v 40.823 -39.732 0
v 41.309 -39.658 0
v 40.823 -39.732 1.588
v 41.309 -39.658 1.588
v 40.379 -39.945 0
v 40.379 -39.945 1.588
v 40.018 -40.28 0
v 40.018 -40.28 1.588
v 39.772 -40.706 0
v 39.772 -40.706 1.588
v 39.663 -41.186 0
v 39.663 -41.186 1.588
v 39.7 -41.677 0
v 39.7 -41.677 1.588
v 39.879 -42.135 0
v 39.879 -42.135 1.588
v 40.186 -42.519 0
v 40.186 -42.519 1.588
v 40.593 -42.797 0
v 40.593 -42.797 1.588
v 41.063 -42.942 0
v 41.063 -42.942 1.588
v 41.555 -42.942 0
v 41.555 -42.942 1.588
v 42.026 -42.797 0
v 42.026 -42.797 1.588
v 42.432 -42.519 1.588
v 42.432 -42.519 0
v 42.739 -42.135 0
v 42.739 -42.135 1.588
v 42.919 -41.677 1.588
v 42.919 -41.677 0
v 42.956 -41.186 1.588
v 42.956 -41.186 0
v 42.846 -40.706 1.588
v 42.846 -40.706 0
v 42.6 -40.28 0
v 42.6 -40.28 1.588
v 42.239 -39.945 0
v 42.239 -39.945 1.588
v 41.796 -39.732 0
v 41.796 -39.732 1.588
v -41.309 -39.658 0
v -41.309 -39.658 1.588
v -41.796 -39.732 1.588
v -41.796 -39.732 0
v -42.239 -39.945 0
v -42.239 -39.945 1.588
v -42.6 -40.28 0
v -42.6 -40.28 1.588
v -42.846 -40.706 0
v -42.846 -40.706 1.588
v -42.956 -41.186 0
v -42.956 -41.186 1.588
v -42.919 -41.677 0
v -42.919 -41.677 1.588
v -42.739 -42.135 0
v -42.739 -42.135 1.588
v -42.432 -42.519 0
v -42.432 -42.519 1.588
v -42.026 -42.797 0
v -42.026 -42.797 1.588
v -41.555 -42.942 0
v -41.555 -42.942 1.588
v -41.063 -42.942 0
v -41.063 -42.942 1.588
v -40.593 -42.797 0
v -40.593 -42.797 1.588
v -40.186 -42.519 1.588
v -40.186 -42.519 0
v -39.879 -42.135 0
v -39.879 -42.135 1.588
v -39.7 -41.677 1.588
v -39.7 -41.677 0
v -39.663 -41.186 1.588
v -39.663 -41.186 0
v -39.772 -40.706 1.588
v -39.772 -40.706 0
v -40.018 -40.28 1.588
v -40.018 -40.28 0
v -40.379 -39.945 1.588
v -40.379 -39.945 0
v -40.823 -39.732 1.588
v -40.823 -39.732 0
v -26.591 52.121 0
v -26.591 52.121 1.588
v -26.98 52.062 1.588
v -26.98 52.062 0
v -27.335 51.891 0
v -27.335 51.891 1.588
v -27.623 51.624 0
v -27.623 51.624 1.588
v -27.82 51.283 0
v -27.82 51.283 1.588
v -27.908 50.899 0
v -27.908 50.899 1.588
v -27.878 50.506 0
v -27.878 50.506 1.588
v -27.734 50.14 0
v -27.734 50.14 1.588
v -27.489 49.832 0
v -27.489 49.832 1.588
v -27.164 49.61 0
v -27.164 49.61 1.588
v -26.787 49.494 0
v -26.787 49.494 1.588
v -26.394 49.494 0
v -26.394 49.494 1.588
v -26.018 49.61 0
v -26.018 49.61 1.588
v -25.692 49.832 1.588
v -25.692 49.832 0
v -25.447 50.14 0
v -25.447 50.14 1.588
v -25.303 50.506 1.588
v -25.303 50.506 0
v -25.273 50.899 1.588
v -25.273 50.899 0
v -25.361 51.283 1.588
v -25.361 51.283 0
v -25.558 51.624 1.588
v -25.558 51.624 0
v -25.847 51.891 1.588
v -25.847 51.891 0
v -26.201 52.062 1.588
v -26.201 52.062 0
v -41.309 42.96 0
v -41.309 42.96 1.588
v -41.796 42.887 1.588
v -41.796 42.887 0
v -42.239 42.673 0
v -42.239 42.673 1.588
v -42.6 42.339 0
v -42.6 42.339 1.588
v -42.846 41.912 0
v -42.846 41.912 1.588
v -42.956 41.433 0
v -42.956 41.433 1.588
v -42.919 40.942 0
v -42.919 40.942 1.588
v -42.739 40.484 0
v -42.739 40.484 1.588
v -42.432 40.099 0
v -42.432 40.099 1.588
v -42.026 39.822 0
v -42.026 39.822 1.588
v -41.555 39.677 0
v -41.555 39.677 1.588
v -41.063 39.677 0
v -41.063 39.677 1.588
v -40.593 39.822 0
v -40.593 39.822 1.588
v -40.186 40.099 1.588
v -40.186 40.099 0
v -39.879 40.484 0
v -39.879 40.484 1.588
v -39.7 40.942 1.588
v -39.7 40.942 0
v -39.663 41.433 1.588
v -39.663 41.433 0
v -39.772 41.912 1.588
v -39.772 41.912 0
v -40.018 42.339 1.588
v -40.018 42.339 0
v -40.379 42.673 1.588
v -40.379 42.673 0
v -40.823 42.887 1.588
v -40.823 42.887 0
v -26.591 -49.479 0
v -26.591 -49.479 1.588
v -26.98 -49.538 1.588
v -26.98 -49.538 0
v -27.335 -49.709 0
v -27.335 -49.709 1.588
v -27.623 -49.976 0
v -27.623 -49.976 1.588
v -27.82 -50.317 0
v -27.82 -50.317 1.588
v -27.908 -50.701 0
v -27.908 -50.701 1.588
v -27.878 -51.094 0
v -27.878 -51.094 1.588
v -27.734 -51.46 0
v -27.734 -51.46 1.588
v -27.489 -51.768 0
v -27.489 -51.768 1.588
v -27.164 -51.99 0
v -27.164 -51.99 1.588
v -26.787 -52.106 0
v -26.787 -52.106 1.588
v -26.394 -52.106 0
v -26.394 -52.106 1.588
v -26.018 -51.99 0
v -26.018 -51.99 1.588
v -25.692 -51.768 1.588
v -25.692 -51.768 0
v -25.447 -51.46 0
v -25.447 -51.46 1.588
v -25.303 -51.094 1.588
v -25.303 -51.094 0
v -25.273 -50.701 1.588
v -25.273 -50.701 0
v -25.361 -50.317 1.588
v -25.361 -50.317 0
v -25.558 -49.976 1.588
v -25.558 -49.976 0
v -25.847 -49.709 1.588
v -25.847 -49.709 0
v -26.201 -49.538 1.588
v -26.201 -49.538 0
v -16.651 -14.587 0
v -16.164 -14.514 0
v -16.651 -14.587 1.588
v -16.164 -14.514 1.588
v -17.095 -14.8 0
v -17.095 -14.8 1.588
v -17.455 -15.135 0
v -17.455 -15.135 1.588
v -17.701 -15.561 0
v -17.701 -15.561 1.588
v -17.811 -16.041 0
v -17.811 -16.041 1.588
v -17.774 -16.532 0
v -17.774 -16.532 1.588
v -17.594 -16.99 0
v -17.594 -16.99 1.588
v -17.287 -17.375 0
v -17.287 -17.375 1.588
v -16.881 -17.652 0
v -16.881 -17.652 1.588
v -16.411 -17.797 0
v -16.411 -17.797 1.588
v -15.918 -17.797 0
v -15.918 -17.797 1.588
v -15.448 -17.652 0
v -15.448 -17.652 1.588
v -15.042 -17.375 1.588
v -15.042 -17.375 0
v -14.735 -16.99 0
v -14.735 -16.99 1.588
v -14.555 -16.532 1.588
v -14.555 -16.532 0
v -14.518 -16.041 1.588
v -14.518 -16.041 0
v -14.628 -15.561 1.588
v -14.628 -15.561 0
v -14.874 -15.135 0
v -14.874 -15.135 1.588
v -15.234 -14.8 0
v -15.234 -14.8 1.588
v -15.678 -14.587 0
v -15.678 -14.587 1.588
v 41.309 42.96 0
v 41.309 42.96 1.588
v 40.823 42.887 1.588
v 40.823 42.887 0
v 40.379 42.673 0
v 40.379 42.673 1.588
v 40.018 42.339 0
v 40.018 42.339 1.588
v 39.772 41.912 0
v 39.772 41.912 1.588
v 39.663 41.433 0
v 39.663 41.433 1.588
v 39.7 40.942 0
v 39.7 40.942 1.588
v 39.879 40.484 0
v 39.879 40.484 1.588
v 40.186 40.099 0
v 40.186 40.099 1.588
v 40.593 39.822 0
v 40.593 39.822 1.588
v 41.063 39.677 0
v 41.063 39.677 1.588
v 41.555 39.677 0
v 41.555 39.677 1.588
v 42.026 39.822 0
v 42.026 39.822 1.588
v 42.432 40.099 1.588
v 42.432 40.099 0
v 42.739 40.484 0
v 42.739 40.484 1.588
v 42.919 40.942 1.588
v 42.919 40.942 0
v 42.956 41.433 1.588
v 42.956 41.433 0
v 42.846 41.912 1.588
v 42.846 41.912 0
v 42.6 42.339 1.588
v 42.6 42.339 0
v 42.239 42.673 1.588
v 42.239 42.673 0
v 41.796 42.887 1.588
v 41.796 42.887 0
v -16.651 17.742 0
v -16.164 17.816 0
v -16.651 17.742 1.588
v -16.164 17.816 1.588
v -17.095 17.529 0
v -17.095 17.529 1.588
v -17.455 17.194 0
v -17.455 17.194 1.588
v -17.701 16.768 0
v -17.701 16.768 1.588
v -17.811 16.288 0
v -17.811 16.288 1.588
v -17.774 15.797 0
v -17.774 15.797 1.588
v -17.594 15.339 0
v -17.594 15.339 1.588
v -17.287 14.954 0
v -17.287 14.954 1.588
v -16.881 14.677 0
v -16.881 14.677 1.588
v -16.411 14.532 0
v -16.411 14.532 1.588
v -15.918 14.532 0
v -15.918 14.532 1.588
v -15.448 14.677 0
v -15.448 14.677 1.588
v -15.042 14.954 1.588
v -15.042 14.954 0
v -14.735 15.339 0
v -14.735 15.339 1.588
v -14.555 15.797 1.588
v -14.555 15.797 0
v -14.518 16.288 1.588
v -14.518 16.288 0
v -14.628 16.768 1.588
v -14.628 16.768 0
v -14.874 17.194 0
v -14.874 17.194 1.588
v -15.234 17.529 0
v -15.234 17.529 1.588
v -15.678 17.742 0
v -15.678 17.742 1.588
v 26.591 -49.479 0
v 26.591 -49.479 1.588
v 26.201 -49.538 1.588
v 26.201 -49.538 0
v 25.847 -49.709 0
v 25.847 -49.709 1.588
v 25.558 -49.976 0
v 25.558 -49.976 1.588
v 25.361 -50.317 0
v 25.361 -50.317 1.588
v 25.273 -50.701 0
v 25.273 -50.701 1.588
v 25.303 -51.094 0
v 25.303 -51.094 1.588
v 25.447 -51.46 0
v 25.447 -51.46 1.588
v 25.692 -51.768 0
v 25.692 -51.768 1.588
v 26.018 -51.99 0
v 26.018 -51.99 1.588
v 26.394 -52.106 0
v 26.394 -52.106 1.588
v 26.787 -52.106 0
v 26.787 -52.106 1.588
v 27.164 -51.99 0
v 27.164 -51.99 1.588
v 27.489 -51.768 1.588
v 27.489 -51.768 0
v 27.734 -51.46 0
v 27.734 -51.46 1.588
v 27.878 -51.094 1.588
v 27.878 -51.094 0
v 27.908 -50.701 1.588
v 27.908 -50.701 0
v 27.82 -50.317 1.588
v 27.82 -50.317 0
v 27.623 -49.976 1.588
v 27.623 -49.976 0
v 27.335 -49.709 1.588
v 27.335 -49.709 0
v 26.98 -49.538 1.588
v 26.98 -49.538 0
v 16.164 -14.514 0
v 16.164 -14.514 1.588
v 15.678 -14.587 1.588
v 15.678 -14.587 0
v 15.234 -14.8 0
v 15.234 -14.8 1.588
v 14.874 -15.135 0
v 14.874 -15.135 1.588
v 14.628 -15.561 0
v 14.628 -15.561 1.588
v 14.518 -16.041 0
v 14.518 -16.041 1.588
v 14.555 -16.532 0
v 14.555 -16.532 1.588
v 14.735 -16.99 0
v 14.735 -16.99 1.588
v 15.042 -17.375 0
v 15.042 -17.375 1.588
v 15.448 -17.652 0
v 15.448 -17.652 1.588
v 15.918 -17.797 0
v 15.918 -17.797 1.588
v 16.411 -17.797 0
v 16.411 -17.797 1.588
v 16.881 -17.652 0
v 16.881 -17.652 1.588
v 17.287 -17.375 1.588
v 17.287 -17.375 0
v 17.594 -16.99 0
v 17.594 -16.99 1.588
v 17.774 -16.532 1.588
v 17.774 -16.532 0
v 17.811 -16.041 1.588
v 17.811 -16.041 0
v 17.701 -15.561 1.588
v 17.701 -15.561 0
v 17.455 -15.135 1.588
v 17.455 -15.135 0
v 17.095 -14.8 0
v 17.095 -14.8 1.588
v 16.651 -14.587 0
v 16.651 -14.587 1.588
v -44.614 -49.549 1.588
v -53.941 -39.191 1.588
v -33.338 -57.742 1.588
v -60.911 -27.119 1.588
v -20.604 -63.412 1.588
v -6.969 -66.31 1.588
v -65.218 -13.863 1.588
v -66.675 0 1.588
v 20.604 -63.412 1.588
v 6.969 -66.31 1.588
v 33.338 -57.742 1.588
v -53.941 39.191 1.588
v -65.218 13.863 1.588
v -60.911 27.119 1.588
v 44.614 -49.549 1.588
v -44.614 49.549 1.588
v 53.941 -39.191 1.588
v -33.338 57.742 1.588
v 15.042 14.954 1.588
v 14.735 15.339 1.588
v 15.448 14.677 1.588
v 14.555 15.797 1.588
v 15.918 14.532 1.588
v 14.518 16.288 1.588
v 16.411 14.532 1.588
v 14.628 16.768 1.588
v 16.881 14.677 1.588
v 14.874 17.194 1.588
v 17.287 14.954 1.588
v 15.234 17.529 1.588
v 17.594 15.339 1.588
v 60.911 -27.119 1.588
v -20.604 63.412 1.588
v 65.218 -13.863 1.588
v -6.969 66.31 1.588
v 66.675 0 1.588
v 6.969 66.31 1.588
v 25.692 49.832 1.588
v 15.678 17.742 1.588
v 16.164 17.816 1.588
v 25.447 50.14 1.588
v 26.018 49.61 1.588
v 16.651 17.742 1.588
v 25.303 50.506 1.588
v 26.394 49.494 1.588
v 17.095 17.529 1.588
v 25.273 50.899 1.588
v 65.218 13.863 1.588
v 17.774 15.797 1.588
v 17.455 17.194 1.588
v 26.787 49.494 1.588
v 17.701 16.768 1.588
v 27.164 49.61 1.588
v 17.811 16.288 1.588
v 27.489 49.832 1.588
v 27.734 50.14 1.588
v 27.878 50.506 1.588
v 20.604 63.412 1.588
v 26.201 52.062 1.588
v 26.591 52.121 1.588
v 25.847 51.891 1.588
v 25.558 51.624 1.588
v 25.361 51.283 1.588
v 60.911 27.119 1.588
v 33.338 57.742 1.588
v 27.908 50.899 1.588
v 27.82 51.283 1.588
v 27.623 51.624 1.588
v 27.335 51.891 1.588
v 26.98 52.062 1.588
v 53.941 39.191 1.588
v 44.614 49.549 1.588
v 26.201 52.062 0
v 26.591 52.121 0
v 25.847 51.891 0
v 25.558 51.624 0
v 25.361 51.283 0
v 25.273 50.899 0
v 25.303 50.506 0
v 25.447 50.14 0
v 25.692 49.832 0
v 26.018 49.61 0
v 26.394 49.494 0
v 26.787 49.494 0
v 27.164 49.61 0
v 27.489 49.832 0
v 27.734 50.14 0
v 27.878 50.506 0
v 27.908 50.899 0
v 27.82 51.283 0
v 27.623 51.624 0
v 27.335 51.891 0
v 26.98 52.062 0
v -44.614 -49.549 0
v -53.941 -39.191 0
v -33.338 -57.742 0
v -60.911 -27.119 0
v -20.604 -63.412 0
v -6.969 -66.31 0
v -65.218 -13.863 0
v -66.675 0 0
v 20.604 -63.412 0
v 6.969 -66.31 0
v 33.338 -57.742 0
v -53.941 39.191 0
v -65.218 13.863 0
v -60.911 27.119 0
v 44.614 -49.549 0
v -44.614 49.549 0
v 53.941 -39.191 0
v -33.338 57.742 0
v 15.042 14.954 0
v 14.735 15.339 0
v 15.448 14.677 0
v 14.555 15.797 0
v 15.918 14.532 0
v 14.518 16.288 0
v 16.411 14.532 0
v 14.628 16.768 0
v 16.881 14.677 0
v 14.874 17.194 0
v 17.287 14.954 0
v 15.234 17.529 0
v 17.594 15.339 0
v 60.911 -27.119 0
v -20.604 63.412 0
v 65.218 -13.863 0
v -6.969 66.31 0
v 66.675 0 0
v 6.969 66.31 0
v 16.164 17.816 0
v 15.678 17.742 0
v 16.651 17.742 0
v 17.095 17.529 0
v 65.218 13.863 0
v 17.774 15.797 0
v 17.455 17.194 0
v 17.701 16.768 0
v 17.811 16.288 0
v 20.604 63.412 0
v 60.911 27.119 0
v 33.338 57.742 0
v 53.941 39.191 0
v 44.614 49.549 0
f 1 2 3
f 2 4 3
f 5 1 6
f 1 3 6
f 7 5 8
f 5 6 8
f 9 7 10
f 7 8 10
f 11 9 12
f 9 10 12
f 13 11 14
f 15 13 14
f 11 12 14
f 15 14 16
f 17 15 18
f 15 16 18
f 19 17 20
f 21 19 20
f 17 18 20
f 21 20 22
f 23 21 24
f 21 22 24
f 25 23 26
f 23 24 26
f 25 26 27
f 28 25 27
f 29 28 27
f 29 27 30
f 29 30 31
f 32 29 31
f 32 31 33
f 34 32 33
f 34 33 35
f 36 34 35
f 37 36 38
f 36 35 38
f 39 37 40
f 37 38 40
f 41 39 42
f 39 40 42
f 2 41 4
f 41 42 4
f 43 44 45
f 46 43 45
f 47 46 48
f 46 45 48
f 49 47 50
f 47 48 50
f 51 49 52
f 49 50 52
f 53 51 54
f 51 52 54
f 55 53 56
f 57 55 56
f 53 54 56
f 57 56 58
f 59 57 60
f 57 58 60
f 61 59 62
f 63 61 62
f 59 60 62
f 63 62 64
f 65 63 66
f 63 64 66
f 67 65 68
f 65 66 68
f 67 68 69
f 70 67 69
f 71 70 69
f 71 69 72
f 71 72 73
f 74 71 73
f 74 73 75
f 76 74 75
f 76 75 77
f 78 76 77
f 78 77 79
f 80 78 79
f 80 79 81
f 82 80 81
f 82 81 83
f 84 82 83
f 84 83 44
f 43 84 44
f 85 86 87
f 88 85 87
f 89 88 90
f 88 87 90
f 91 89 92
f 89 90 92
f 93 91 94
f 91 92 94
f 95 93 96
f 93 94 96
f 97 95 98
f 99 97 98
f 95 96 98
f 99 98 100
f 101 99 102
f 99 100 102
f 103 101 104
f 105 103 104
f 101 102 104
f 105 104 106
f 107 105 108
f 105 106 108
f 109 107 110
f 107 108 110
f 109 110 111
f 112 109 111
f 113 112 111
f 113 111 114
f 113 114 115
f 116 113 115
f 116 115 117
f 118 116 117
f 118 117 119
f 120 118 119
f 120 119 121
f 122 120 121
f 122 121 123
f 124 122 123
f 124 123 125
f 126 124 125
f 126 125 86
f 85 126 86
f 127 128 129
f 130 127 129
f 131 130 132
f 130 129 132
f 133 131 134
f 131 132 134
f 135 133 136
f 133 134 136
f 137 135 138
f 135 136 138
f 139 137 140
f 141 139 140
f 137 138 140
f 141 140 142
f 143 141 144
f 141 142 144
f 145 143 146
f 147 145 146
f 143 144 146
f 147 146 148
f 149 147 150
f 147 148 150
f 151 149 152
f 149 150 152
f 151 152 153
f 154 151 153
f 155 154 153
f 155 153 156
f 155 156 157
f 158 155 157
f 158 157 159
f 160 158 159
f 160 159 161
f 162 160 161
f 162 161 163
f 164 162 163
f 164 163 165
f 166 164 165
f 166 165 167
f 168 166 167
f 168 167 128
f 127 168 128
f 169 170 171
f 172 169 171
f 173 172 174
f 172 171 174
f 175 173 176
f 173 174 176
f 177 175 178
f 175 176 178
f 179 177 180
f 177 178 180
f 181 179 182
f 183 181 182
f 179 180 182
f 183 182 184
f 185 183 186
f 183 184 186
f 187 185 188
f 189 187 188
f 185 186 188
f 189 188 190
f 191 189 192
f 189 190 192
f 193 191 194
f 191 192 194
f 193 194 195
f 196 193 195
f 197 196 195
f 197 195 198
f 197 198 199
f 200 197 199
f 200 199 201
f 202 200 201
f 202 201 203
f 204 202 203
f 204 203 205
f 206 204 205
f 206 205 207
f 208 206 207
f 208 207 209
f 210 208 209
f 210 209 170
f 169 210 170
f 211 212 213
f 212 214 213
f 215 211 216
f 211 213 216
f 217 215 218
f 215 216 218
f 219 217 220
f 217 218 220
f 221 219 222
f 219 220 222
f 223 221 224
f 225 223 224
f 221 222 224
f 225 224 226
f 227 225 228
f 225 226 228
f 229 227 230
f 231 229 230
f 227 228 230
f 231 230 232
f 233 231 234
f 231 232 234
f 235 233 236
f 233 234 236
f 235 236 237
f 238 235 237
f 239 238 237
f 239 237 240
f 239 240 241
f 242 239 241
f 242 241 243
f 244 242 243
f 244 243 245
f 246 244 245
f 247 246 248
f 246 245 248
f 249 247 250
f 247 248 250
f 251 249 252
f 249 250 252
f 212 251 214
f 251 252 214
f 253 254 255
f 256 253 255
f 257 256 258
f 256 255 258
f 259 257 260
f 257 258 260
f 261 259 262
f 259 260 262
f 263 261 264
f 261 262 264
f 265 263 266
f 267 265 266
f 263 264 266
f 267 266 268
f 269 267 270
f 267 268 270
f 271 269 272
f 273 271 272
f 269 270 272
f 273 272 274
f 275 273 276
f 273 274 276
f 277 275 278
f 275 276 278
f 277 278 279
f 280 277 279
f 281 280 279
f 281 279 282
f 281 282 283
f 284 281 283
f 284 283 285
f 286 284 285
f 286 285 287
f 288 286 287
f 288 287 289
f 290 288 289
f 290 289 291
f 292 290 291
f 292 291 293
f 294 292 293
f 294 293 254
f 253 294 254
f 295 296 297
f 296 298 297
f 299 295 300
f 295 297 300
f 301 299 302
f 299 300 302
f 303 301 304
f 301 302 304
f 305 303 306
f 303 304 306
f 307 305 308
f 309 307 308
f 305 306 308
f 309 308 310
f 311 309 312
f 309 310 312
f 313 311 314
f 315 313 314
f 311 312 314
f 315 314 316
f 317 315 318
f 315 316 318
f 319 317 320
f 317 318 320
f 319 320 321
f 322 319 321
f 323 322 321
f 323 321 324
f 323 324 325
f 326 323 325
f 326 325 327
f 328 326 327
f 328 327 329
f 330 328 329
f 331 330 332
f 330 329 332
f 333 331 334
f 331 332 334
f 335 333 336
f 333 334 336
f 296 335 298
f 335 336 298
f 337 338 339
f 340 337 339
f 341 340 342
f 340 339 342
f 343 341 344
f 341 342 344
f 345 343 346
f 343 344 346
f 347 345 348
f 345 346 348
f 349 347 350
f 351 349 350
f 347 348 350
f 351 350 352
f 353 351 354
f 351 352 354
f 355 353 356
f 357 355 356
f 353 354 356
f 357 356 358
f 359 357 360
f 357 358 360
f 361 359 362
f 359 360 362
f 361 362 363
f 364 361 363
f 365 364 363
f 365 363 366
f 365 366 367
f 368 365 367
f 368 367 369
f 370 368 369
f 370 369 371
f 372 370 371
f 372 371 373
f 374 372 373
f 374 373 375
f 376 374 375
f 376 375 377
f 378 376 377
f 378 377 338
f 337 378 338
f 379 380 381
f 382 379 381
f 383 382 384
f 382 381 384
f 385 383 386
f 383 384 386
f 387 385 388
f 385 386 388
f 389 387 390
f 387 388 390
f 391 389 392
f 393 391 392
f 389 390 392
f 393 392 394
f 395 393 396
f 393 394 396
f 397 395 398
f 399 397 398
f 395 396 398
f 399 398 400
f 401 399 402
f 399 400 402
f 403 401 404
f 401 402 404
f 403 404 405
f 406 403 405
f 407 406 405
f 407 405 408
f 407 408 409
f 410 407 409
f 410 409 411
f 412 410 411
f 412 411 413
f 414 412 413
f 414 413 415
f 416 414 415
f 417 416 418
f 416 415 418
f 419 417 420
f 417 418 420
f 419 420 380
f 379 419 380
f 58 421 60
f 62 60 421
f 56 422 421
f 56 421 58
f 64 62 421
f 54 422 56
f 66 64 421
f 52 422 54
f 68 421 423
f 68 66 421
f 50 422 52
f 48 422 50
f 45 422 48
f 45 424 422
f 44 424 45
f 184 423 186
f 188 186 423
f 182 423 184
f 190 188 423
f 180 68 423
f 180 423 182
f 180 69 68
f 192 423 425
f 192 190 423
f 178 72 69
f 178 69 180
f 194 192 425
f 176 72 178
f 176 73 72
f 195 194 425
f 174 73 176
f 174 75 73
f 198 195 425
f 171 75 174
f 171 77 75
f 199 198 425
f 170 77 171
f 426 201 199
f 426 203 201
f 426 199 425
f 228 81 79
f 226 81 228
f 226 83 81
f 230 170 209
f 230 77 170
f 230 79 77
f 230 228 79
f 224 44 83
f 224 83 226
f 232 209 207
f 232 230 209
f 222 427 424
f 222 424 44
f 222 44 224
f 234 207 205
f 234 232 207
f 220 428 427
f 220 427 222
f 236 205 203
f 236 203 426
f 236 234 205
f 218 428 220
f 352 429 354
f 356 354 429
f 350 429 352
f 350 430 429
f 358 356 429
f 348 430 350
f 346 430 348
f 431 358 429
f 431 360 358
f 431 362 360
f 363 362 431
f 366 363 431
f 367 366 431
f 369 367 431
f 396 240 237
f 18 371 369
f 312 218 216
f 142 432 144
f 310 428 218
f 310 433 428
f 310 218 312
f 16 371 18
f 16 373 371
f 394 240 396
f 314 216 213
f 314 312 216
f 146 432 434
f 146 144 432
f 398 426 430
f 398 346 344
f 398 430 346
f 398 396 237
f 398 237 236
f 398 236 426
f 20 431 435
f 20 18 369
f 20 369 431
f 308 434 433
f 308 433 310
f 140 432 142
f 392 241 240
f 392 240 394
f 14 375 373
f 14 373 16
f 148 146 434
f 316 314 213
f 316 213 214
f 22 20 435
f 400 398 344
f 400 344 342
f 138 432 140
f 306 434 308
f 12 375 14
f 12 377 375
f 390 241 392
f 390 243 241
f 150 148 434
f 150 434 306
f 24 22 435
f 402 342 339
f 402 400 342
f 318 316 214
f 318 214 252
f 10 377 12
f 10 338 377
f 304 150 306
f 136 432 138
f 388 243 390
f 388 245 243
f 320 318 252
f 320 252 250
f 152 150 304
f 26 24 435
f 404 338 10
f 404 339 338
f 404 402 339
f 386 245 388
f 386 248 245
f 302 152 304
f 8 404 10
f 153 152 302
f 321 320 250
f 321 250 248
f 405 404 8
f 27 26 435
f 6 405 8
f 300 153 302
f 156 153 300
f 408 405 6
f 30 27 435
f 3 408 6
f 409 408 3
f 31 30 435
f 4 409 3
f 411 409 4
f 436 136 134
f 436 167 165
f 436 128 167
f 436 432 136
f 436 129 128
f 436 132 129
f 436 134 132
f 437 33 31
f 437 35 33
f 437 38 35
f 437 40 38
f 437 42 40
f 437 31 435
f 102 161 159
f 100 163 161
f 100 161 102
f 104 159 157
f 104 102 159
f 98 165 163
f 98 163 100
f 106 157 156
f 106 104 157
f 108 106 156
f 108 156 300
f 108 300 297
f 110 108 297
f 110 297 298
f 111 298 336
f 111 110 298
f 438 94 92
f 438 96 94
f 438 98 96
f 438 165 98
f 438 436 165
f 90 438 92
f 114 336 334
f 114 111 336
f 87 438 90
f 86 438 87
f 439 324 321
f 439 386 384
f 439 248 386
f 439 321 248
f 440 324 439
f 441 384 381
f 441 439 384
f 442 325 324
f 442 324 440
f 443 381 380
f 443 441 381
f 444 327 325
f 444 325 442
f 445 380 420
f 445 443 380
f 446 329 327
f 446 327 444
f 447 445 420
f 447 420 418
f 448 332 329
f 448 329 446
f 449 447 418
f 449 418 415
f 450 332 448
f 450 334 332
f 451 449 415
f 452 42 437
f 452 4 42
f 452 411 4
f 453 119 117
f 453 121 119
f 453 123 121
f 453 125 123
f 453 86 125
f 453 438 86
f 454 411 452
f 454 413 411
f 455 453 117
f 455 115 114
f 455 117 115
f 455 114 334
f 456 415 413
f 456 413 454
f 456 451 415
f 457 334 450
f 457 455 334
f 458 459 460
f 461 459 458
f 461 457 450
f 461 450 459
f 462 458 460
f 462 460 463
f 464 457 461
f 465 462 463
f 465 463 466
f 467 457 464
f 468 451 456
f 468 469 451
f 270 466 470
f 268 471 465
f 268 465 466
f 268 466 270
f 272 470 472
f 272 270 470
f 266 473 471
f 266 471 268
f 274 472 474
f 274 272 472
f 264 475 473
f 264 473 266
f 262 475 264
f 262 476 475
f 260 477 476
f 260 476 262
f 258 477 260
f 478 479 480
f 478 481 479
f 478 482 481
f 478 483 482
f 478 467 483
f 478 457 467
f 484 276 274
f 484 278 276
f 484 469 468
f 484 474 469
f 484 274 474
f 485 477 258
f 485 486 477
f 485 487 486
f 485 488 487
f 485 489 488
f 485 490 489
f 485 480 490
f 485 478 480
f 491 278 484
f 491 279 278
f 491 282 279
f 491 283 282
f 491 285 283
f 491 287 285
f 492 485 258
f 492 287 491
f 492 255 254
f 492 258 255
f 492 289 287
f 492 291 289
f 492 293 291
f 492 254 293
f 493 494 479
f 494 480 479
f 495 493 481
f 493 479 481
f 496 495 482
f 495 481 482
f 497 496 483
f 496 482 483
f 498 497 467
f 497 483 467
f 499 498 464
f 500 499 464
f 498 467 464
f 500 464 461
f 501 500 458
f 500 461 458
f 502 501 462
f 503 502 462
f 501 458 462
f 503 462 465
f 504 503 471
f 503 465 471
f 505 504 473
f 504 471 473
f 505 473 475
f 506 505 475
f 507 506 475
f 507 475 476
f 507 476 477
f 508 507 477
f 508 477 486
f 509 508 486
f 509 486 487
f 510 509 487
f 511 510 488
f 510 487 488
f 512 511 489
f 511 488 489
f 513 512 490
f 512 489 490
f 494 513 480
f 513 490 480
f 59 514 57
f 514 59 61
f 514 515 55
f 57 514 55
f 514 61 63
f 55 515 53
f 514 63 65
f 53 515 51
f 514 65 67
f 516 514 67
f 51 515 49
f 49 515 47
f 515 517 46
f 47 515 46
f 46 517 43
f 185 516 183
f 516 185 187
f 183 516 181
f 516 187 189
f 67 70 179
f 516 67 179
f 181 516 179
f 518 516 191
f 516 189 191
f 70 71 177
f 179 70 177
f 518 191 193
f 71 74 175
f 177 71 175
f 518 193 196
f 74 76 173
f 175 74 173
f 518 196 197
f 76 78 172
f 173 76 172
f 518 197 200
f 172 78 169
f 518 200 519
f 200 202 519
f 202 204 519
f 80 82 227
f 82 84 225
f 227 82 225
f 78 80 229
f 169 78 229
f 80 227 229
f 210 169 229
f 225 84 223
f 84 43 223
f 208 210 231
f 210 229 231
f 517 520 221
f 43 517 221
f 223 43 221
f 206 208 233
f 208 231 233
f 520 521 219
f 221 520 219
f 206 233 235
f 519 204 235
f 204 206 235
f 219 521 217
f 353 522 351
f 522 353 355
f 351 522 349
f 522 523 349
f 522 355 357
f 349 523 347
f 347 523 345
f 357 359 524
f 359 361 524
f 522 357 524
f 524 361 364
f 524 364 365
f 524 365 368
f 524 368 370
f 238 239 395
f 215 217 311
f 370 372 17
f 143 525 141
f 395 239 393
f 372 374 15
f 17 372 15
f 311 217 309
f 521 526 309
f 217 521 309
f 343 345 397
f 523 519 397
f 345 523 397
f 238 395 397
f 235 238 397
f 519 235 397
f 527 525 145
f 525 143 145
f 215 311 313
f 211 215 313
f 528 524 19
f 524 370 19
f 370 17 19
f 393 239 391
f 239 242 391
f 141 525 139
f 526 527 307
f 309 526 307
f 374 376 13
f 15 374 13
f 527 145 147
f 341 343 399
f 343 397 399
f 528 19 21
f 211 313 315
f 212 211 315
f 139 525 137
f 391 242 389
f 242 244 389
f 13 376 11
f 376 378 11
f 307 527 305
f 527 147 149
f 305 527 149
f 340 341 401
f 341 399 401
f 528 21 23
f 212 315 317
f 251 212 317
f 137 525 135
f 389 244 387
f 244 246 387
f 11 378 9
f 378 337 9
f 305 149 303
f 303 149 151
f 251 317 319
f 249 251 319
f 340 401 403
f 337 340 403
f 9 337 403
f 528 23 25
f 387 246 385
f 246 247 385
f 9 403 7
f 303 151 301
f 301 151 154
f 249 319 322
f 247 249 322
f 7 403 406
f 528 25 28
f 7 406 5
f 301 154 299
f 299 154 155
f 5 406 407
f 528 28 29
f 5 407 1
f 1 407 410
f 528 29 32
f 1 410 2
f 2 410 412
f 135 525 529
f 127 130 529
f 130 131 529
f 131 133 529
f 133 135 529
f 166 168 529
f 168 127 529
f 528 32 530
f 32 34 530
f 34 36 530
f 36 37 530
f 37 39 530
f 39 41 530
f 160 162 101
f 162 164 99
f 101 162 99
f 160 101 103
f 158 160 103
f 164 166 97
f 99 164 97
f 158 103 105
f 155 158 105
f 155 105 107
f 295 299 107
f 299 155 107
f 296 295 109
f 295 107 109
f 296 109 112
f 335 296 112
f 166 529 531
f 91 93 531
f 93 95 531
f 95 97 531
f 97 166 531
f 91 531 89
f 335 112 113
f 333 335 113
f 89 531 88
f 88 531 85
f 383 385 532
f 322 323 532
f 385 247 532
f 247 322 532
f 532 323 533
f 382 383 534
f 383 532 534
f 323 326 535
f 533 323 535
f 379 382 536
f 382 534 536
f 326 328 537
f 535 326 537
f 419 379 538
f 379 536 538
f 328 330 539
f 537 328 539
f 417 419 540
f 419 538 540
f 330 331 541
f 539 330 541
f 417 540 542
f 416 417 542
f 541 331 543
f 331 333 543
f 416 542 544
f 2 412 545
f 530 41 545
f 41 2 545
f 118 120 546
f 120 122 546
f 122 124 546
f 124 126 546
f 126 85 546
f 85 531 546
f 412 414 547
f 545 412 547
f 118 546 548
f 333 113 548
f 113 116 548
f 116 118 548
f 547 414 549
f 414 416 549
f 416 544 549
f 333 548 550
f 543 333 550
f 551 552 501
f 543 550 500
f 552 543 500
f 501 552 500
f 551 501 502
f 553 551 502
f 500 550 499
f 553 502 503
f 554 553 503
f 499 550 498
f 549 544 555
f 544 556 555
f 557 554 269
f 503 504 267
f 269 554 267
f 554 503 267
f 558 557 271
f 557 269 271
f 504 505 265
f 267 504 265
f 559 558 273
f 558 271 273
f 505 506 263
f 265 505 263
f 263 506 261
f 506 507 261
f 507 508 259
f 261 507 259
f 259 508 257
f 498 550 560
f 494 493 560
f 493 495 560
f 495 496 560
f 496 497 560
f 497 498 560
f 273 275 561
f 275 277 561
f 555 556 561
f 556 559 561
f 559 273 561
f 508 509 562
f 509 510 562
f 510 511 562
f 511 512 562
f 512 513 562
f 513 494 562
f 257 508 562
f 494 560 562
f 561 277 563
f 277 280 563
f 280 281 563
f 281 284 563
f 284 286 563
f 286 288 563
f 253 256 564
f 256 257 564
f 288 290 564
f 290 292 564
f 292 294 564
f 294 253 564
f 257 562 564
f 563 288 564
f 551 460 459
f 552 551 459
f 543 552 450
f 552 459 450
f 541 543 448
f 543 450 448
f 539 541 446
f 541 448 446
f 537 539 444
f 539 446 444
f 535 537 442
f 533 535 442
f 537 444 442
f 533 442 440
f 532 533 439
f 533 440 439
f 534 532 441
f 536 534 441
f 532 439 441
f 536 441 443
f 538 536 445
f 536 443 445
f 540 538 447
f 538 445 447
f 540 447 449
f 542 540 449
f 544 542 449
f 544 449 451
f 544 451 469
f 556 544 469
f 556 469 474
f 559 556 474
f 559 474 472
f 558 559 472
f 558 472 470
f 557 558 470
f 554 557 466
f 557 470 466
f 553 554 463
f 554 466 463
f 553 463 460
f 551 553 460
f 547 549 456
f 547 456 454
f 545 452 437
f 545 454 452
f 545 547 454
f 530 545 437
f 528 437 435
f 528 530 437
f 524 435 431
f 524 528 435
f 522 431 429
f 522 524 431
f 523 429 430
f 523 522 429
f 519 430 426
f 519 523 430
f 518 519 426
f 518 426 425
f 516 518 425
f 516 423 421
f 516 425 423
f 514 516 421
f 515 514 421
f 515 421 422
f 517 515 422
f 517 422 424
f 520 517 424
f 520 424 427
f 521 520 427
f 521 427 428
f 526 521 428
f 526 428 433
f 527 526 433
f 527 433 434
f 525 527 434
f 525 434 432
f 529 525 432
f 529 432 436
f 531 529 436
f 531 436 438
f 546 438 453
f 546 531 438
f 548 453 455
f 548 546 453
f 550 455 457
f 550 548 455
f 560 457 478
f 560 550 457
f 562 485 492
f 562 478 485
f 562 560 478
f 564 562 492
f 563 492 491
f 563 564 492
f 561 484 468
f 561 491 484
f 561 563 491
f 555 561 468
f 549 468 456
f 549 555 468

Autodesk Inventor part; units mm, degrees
ref_plane "YZ Plane" through (0, 0, 0) normal (1, 0, 0) x (0, 1, 0)
ref_plane "XZ Plane" through (0, 0, 0) normal (0, 1, 0) x (-1, 0, 0)
ref_plane "XY Plane" through (0, 0, 0) normal (0, 0, 1) x (1, 0, 0)
sketch "Sketch1" plane through (0, 0, 0) normal (0, 0, 1) x (1, 0, 0)
  line L0 (0, 10.0078) -> (0, -10.7712)
  line L1 (-20.5368, 0) -> (25.7294, 0)
  line L2 (0, 0) -> (-9.8402, -9.8402)
  line L3 (0, 0) -> (13.9161, 0) construction
  line L4 (0, 0) -> (-23.2805, 23.2805)
  circle A0 centre (0, 0) radius 66.675
  point P0 (-16.1645, 16.1645)
  point P1 (-41.3092, 41.3092)
  point P2 (-41.3092, -41.3092)
  point P3 (-16.1645, -16.1645)
  point P4 (16.1645, 16.1645)
  point P5 (41.3092, 41.3092)
  point P6 (41.3092, -41.3092)
  point P7 (16.1645, -16.1645)
  point P8 (26.5906, 50.8)
  point P9 (-26.5906, 50.8)
  point P10 (23.2805, 23.2805)
  point P11 (16.1645, 16.1645)
  point P12 (26.5906, -50.8)
  point P13 (-26.5906, -50.8)
  dimension "d1" = 45
  dimension "d56" = 22.86
  dimension "d58" = 35.56
  dimension "d67" = 53.1812
  dimension "d68" = 101.6
  dimension "d85" = 133.35
extrude "Extrusion1" add sketch "Sketch1" along normal blind 1.5875
hole "Hole1" at (-16.1645, 16.1645, 0) at (-41.3092, 41.3092, 0) at (-41.3092, -41.3092, 0) at (-16.1645, -16.1645, 0) at (41.3092, 41.3092, 0) at (16.1645, 16.1645, 0) at (16.1645, -16.1645, 0) at (41.3092, -41.3092, 0) direction (0, 0, 1) diameter 3.302 end through all thread size "8-32 UNC" class "2B" standard "ANSI Unified Screw Threads"
sketch "Sketch2" plane through (0, 0, 0) normal (0, 0, -1) x (-1, 0, 0)
  line L0 (0, -11.8713) -> (0, 16.3095)
  line L1 (-16.3095, 0) -> (16.3095, 0)
  point P0 (23.2805, -60.3987)
  point P1 (0, 0)
  point P2 (26.5906, 50.8)
  point P3 (-26.5906, 50.8)
  point P4 (26.5906, -50.8)
  point P5 (-26.5906, -50.8)
  dimension "d69" = 53.1812
  dimension "d70" = 101.6
hole "Hole3" at (-26.5906, -50.8, 0) at (26.5906, -50.8, 0) at (26.5906, 50.8, 0) at (-26.5906, 50.8, 0) direction (0, 0, 1) diameter 2.6416 end through all thread size "6-32 UNC" class "2B" standard "ANSI Unified Screw Threads"
properties part number "BaseBottom"
